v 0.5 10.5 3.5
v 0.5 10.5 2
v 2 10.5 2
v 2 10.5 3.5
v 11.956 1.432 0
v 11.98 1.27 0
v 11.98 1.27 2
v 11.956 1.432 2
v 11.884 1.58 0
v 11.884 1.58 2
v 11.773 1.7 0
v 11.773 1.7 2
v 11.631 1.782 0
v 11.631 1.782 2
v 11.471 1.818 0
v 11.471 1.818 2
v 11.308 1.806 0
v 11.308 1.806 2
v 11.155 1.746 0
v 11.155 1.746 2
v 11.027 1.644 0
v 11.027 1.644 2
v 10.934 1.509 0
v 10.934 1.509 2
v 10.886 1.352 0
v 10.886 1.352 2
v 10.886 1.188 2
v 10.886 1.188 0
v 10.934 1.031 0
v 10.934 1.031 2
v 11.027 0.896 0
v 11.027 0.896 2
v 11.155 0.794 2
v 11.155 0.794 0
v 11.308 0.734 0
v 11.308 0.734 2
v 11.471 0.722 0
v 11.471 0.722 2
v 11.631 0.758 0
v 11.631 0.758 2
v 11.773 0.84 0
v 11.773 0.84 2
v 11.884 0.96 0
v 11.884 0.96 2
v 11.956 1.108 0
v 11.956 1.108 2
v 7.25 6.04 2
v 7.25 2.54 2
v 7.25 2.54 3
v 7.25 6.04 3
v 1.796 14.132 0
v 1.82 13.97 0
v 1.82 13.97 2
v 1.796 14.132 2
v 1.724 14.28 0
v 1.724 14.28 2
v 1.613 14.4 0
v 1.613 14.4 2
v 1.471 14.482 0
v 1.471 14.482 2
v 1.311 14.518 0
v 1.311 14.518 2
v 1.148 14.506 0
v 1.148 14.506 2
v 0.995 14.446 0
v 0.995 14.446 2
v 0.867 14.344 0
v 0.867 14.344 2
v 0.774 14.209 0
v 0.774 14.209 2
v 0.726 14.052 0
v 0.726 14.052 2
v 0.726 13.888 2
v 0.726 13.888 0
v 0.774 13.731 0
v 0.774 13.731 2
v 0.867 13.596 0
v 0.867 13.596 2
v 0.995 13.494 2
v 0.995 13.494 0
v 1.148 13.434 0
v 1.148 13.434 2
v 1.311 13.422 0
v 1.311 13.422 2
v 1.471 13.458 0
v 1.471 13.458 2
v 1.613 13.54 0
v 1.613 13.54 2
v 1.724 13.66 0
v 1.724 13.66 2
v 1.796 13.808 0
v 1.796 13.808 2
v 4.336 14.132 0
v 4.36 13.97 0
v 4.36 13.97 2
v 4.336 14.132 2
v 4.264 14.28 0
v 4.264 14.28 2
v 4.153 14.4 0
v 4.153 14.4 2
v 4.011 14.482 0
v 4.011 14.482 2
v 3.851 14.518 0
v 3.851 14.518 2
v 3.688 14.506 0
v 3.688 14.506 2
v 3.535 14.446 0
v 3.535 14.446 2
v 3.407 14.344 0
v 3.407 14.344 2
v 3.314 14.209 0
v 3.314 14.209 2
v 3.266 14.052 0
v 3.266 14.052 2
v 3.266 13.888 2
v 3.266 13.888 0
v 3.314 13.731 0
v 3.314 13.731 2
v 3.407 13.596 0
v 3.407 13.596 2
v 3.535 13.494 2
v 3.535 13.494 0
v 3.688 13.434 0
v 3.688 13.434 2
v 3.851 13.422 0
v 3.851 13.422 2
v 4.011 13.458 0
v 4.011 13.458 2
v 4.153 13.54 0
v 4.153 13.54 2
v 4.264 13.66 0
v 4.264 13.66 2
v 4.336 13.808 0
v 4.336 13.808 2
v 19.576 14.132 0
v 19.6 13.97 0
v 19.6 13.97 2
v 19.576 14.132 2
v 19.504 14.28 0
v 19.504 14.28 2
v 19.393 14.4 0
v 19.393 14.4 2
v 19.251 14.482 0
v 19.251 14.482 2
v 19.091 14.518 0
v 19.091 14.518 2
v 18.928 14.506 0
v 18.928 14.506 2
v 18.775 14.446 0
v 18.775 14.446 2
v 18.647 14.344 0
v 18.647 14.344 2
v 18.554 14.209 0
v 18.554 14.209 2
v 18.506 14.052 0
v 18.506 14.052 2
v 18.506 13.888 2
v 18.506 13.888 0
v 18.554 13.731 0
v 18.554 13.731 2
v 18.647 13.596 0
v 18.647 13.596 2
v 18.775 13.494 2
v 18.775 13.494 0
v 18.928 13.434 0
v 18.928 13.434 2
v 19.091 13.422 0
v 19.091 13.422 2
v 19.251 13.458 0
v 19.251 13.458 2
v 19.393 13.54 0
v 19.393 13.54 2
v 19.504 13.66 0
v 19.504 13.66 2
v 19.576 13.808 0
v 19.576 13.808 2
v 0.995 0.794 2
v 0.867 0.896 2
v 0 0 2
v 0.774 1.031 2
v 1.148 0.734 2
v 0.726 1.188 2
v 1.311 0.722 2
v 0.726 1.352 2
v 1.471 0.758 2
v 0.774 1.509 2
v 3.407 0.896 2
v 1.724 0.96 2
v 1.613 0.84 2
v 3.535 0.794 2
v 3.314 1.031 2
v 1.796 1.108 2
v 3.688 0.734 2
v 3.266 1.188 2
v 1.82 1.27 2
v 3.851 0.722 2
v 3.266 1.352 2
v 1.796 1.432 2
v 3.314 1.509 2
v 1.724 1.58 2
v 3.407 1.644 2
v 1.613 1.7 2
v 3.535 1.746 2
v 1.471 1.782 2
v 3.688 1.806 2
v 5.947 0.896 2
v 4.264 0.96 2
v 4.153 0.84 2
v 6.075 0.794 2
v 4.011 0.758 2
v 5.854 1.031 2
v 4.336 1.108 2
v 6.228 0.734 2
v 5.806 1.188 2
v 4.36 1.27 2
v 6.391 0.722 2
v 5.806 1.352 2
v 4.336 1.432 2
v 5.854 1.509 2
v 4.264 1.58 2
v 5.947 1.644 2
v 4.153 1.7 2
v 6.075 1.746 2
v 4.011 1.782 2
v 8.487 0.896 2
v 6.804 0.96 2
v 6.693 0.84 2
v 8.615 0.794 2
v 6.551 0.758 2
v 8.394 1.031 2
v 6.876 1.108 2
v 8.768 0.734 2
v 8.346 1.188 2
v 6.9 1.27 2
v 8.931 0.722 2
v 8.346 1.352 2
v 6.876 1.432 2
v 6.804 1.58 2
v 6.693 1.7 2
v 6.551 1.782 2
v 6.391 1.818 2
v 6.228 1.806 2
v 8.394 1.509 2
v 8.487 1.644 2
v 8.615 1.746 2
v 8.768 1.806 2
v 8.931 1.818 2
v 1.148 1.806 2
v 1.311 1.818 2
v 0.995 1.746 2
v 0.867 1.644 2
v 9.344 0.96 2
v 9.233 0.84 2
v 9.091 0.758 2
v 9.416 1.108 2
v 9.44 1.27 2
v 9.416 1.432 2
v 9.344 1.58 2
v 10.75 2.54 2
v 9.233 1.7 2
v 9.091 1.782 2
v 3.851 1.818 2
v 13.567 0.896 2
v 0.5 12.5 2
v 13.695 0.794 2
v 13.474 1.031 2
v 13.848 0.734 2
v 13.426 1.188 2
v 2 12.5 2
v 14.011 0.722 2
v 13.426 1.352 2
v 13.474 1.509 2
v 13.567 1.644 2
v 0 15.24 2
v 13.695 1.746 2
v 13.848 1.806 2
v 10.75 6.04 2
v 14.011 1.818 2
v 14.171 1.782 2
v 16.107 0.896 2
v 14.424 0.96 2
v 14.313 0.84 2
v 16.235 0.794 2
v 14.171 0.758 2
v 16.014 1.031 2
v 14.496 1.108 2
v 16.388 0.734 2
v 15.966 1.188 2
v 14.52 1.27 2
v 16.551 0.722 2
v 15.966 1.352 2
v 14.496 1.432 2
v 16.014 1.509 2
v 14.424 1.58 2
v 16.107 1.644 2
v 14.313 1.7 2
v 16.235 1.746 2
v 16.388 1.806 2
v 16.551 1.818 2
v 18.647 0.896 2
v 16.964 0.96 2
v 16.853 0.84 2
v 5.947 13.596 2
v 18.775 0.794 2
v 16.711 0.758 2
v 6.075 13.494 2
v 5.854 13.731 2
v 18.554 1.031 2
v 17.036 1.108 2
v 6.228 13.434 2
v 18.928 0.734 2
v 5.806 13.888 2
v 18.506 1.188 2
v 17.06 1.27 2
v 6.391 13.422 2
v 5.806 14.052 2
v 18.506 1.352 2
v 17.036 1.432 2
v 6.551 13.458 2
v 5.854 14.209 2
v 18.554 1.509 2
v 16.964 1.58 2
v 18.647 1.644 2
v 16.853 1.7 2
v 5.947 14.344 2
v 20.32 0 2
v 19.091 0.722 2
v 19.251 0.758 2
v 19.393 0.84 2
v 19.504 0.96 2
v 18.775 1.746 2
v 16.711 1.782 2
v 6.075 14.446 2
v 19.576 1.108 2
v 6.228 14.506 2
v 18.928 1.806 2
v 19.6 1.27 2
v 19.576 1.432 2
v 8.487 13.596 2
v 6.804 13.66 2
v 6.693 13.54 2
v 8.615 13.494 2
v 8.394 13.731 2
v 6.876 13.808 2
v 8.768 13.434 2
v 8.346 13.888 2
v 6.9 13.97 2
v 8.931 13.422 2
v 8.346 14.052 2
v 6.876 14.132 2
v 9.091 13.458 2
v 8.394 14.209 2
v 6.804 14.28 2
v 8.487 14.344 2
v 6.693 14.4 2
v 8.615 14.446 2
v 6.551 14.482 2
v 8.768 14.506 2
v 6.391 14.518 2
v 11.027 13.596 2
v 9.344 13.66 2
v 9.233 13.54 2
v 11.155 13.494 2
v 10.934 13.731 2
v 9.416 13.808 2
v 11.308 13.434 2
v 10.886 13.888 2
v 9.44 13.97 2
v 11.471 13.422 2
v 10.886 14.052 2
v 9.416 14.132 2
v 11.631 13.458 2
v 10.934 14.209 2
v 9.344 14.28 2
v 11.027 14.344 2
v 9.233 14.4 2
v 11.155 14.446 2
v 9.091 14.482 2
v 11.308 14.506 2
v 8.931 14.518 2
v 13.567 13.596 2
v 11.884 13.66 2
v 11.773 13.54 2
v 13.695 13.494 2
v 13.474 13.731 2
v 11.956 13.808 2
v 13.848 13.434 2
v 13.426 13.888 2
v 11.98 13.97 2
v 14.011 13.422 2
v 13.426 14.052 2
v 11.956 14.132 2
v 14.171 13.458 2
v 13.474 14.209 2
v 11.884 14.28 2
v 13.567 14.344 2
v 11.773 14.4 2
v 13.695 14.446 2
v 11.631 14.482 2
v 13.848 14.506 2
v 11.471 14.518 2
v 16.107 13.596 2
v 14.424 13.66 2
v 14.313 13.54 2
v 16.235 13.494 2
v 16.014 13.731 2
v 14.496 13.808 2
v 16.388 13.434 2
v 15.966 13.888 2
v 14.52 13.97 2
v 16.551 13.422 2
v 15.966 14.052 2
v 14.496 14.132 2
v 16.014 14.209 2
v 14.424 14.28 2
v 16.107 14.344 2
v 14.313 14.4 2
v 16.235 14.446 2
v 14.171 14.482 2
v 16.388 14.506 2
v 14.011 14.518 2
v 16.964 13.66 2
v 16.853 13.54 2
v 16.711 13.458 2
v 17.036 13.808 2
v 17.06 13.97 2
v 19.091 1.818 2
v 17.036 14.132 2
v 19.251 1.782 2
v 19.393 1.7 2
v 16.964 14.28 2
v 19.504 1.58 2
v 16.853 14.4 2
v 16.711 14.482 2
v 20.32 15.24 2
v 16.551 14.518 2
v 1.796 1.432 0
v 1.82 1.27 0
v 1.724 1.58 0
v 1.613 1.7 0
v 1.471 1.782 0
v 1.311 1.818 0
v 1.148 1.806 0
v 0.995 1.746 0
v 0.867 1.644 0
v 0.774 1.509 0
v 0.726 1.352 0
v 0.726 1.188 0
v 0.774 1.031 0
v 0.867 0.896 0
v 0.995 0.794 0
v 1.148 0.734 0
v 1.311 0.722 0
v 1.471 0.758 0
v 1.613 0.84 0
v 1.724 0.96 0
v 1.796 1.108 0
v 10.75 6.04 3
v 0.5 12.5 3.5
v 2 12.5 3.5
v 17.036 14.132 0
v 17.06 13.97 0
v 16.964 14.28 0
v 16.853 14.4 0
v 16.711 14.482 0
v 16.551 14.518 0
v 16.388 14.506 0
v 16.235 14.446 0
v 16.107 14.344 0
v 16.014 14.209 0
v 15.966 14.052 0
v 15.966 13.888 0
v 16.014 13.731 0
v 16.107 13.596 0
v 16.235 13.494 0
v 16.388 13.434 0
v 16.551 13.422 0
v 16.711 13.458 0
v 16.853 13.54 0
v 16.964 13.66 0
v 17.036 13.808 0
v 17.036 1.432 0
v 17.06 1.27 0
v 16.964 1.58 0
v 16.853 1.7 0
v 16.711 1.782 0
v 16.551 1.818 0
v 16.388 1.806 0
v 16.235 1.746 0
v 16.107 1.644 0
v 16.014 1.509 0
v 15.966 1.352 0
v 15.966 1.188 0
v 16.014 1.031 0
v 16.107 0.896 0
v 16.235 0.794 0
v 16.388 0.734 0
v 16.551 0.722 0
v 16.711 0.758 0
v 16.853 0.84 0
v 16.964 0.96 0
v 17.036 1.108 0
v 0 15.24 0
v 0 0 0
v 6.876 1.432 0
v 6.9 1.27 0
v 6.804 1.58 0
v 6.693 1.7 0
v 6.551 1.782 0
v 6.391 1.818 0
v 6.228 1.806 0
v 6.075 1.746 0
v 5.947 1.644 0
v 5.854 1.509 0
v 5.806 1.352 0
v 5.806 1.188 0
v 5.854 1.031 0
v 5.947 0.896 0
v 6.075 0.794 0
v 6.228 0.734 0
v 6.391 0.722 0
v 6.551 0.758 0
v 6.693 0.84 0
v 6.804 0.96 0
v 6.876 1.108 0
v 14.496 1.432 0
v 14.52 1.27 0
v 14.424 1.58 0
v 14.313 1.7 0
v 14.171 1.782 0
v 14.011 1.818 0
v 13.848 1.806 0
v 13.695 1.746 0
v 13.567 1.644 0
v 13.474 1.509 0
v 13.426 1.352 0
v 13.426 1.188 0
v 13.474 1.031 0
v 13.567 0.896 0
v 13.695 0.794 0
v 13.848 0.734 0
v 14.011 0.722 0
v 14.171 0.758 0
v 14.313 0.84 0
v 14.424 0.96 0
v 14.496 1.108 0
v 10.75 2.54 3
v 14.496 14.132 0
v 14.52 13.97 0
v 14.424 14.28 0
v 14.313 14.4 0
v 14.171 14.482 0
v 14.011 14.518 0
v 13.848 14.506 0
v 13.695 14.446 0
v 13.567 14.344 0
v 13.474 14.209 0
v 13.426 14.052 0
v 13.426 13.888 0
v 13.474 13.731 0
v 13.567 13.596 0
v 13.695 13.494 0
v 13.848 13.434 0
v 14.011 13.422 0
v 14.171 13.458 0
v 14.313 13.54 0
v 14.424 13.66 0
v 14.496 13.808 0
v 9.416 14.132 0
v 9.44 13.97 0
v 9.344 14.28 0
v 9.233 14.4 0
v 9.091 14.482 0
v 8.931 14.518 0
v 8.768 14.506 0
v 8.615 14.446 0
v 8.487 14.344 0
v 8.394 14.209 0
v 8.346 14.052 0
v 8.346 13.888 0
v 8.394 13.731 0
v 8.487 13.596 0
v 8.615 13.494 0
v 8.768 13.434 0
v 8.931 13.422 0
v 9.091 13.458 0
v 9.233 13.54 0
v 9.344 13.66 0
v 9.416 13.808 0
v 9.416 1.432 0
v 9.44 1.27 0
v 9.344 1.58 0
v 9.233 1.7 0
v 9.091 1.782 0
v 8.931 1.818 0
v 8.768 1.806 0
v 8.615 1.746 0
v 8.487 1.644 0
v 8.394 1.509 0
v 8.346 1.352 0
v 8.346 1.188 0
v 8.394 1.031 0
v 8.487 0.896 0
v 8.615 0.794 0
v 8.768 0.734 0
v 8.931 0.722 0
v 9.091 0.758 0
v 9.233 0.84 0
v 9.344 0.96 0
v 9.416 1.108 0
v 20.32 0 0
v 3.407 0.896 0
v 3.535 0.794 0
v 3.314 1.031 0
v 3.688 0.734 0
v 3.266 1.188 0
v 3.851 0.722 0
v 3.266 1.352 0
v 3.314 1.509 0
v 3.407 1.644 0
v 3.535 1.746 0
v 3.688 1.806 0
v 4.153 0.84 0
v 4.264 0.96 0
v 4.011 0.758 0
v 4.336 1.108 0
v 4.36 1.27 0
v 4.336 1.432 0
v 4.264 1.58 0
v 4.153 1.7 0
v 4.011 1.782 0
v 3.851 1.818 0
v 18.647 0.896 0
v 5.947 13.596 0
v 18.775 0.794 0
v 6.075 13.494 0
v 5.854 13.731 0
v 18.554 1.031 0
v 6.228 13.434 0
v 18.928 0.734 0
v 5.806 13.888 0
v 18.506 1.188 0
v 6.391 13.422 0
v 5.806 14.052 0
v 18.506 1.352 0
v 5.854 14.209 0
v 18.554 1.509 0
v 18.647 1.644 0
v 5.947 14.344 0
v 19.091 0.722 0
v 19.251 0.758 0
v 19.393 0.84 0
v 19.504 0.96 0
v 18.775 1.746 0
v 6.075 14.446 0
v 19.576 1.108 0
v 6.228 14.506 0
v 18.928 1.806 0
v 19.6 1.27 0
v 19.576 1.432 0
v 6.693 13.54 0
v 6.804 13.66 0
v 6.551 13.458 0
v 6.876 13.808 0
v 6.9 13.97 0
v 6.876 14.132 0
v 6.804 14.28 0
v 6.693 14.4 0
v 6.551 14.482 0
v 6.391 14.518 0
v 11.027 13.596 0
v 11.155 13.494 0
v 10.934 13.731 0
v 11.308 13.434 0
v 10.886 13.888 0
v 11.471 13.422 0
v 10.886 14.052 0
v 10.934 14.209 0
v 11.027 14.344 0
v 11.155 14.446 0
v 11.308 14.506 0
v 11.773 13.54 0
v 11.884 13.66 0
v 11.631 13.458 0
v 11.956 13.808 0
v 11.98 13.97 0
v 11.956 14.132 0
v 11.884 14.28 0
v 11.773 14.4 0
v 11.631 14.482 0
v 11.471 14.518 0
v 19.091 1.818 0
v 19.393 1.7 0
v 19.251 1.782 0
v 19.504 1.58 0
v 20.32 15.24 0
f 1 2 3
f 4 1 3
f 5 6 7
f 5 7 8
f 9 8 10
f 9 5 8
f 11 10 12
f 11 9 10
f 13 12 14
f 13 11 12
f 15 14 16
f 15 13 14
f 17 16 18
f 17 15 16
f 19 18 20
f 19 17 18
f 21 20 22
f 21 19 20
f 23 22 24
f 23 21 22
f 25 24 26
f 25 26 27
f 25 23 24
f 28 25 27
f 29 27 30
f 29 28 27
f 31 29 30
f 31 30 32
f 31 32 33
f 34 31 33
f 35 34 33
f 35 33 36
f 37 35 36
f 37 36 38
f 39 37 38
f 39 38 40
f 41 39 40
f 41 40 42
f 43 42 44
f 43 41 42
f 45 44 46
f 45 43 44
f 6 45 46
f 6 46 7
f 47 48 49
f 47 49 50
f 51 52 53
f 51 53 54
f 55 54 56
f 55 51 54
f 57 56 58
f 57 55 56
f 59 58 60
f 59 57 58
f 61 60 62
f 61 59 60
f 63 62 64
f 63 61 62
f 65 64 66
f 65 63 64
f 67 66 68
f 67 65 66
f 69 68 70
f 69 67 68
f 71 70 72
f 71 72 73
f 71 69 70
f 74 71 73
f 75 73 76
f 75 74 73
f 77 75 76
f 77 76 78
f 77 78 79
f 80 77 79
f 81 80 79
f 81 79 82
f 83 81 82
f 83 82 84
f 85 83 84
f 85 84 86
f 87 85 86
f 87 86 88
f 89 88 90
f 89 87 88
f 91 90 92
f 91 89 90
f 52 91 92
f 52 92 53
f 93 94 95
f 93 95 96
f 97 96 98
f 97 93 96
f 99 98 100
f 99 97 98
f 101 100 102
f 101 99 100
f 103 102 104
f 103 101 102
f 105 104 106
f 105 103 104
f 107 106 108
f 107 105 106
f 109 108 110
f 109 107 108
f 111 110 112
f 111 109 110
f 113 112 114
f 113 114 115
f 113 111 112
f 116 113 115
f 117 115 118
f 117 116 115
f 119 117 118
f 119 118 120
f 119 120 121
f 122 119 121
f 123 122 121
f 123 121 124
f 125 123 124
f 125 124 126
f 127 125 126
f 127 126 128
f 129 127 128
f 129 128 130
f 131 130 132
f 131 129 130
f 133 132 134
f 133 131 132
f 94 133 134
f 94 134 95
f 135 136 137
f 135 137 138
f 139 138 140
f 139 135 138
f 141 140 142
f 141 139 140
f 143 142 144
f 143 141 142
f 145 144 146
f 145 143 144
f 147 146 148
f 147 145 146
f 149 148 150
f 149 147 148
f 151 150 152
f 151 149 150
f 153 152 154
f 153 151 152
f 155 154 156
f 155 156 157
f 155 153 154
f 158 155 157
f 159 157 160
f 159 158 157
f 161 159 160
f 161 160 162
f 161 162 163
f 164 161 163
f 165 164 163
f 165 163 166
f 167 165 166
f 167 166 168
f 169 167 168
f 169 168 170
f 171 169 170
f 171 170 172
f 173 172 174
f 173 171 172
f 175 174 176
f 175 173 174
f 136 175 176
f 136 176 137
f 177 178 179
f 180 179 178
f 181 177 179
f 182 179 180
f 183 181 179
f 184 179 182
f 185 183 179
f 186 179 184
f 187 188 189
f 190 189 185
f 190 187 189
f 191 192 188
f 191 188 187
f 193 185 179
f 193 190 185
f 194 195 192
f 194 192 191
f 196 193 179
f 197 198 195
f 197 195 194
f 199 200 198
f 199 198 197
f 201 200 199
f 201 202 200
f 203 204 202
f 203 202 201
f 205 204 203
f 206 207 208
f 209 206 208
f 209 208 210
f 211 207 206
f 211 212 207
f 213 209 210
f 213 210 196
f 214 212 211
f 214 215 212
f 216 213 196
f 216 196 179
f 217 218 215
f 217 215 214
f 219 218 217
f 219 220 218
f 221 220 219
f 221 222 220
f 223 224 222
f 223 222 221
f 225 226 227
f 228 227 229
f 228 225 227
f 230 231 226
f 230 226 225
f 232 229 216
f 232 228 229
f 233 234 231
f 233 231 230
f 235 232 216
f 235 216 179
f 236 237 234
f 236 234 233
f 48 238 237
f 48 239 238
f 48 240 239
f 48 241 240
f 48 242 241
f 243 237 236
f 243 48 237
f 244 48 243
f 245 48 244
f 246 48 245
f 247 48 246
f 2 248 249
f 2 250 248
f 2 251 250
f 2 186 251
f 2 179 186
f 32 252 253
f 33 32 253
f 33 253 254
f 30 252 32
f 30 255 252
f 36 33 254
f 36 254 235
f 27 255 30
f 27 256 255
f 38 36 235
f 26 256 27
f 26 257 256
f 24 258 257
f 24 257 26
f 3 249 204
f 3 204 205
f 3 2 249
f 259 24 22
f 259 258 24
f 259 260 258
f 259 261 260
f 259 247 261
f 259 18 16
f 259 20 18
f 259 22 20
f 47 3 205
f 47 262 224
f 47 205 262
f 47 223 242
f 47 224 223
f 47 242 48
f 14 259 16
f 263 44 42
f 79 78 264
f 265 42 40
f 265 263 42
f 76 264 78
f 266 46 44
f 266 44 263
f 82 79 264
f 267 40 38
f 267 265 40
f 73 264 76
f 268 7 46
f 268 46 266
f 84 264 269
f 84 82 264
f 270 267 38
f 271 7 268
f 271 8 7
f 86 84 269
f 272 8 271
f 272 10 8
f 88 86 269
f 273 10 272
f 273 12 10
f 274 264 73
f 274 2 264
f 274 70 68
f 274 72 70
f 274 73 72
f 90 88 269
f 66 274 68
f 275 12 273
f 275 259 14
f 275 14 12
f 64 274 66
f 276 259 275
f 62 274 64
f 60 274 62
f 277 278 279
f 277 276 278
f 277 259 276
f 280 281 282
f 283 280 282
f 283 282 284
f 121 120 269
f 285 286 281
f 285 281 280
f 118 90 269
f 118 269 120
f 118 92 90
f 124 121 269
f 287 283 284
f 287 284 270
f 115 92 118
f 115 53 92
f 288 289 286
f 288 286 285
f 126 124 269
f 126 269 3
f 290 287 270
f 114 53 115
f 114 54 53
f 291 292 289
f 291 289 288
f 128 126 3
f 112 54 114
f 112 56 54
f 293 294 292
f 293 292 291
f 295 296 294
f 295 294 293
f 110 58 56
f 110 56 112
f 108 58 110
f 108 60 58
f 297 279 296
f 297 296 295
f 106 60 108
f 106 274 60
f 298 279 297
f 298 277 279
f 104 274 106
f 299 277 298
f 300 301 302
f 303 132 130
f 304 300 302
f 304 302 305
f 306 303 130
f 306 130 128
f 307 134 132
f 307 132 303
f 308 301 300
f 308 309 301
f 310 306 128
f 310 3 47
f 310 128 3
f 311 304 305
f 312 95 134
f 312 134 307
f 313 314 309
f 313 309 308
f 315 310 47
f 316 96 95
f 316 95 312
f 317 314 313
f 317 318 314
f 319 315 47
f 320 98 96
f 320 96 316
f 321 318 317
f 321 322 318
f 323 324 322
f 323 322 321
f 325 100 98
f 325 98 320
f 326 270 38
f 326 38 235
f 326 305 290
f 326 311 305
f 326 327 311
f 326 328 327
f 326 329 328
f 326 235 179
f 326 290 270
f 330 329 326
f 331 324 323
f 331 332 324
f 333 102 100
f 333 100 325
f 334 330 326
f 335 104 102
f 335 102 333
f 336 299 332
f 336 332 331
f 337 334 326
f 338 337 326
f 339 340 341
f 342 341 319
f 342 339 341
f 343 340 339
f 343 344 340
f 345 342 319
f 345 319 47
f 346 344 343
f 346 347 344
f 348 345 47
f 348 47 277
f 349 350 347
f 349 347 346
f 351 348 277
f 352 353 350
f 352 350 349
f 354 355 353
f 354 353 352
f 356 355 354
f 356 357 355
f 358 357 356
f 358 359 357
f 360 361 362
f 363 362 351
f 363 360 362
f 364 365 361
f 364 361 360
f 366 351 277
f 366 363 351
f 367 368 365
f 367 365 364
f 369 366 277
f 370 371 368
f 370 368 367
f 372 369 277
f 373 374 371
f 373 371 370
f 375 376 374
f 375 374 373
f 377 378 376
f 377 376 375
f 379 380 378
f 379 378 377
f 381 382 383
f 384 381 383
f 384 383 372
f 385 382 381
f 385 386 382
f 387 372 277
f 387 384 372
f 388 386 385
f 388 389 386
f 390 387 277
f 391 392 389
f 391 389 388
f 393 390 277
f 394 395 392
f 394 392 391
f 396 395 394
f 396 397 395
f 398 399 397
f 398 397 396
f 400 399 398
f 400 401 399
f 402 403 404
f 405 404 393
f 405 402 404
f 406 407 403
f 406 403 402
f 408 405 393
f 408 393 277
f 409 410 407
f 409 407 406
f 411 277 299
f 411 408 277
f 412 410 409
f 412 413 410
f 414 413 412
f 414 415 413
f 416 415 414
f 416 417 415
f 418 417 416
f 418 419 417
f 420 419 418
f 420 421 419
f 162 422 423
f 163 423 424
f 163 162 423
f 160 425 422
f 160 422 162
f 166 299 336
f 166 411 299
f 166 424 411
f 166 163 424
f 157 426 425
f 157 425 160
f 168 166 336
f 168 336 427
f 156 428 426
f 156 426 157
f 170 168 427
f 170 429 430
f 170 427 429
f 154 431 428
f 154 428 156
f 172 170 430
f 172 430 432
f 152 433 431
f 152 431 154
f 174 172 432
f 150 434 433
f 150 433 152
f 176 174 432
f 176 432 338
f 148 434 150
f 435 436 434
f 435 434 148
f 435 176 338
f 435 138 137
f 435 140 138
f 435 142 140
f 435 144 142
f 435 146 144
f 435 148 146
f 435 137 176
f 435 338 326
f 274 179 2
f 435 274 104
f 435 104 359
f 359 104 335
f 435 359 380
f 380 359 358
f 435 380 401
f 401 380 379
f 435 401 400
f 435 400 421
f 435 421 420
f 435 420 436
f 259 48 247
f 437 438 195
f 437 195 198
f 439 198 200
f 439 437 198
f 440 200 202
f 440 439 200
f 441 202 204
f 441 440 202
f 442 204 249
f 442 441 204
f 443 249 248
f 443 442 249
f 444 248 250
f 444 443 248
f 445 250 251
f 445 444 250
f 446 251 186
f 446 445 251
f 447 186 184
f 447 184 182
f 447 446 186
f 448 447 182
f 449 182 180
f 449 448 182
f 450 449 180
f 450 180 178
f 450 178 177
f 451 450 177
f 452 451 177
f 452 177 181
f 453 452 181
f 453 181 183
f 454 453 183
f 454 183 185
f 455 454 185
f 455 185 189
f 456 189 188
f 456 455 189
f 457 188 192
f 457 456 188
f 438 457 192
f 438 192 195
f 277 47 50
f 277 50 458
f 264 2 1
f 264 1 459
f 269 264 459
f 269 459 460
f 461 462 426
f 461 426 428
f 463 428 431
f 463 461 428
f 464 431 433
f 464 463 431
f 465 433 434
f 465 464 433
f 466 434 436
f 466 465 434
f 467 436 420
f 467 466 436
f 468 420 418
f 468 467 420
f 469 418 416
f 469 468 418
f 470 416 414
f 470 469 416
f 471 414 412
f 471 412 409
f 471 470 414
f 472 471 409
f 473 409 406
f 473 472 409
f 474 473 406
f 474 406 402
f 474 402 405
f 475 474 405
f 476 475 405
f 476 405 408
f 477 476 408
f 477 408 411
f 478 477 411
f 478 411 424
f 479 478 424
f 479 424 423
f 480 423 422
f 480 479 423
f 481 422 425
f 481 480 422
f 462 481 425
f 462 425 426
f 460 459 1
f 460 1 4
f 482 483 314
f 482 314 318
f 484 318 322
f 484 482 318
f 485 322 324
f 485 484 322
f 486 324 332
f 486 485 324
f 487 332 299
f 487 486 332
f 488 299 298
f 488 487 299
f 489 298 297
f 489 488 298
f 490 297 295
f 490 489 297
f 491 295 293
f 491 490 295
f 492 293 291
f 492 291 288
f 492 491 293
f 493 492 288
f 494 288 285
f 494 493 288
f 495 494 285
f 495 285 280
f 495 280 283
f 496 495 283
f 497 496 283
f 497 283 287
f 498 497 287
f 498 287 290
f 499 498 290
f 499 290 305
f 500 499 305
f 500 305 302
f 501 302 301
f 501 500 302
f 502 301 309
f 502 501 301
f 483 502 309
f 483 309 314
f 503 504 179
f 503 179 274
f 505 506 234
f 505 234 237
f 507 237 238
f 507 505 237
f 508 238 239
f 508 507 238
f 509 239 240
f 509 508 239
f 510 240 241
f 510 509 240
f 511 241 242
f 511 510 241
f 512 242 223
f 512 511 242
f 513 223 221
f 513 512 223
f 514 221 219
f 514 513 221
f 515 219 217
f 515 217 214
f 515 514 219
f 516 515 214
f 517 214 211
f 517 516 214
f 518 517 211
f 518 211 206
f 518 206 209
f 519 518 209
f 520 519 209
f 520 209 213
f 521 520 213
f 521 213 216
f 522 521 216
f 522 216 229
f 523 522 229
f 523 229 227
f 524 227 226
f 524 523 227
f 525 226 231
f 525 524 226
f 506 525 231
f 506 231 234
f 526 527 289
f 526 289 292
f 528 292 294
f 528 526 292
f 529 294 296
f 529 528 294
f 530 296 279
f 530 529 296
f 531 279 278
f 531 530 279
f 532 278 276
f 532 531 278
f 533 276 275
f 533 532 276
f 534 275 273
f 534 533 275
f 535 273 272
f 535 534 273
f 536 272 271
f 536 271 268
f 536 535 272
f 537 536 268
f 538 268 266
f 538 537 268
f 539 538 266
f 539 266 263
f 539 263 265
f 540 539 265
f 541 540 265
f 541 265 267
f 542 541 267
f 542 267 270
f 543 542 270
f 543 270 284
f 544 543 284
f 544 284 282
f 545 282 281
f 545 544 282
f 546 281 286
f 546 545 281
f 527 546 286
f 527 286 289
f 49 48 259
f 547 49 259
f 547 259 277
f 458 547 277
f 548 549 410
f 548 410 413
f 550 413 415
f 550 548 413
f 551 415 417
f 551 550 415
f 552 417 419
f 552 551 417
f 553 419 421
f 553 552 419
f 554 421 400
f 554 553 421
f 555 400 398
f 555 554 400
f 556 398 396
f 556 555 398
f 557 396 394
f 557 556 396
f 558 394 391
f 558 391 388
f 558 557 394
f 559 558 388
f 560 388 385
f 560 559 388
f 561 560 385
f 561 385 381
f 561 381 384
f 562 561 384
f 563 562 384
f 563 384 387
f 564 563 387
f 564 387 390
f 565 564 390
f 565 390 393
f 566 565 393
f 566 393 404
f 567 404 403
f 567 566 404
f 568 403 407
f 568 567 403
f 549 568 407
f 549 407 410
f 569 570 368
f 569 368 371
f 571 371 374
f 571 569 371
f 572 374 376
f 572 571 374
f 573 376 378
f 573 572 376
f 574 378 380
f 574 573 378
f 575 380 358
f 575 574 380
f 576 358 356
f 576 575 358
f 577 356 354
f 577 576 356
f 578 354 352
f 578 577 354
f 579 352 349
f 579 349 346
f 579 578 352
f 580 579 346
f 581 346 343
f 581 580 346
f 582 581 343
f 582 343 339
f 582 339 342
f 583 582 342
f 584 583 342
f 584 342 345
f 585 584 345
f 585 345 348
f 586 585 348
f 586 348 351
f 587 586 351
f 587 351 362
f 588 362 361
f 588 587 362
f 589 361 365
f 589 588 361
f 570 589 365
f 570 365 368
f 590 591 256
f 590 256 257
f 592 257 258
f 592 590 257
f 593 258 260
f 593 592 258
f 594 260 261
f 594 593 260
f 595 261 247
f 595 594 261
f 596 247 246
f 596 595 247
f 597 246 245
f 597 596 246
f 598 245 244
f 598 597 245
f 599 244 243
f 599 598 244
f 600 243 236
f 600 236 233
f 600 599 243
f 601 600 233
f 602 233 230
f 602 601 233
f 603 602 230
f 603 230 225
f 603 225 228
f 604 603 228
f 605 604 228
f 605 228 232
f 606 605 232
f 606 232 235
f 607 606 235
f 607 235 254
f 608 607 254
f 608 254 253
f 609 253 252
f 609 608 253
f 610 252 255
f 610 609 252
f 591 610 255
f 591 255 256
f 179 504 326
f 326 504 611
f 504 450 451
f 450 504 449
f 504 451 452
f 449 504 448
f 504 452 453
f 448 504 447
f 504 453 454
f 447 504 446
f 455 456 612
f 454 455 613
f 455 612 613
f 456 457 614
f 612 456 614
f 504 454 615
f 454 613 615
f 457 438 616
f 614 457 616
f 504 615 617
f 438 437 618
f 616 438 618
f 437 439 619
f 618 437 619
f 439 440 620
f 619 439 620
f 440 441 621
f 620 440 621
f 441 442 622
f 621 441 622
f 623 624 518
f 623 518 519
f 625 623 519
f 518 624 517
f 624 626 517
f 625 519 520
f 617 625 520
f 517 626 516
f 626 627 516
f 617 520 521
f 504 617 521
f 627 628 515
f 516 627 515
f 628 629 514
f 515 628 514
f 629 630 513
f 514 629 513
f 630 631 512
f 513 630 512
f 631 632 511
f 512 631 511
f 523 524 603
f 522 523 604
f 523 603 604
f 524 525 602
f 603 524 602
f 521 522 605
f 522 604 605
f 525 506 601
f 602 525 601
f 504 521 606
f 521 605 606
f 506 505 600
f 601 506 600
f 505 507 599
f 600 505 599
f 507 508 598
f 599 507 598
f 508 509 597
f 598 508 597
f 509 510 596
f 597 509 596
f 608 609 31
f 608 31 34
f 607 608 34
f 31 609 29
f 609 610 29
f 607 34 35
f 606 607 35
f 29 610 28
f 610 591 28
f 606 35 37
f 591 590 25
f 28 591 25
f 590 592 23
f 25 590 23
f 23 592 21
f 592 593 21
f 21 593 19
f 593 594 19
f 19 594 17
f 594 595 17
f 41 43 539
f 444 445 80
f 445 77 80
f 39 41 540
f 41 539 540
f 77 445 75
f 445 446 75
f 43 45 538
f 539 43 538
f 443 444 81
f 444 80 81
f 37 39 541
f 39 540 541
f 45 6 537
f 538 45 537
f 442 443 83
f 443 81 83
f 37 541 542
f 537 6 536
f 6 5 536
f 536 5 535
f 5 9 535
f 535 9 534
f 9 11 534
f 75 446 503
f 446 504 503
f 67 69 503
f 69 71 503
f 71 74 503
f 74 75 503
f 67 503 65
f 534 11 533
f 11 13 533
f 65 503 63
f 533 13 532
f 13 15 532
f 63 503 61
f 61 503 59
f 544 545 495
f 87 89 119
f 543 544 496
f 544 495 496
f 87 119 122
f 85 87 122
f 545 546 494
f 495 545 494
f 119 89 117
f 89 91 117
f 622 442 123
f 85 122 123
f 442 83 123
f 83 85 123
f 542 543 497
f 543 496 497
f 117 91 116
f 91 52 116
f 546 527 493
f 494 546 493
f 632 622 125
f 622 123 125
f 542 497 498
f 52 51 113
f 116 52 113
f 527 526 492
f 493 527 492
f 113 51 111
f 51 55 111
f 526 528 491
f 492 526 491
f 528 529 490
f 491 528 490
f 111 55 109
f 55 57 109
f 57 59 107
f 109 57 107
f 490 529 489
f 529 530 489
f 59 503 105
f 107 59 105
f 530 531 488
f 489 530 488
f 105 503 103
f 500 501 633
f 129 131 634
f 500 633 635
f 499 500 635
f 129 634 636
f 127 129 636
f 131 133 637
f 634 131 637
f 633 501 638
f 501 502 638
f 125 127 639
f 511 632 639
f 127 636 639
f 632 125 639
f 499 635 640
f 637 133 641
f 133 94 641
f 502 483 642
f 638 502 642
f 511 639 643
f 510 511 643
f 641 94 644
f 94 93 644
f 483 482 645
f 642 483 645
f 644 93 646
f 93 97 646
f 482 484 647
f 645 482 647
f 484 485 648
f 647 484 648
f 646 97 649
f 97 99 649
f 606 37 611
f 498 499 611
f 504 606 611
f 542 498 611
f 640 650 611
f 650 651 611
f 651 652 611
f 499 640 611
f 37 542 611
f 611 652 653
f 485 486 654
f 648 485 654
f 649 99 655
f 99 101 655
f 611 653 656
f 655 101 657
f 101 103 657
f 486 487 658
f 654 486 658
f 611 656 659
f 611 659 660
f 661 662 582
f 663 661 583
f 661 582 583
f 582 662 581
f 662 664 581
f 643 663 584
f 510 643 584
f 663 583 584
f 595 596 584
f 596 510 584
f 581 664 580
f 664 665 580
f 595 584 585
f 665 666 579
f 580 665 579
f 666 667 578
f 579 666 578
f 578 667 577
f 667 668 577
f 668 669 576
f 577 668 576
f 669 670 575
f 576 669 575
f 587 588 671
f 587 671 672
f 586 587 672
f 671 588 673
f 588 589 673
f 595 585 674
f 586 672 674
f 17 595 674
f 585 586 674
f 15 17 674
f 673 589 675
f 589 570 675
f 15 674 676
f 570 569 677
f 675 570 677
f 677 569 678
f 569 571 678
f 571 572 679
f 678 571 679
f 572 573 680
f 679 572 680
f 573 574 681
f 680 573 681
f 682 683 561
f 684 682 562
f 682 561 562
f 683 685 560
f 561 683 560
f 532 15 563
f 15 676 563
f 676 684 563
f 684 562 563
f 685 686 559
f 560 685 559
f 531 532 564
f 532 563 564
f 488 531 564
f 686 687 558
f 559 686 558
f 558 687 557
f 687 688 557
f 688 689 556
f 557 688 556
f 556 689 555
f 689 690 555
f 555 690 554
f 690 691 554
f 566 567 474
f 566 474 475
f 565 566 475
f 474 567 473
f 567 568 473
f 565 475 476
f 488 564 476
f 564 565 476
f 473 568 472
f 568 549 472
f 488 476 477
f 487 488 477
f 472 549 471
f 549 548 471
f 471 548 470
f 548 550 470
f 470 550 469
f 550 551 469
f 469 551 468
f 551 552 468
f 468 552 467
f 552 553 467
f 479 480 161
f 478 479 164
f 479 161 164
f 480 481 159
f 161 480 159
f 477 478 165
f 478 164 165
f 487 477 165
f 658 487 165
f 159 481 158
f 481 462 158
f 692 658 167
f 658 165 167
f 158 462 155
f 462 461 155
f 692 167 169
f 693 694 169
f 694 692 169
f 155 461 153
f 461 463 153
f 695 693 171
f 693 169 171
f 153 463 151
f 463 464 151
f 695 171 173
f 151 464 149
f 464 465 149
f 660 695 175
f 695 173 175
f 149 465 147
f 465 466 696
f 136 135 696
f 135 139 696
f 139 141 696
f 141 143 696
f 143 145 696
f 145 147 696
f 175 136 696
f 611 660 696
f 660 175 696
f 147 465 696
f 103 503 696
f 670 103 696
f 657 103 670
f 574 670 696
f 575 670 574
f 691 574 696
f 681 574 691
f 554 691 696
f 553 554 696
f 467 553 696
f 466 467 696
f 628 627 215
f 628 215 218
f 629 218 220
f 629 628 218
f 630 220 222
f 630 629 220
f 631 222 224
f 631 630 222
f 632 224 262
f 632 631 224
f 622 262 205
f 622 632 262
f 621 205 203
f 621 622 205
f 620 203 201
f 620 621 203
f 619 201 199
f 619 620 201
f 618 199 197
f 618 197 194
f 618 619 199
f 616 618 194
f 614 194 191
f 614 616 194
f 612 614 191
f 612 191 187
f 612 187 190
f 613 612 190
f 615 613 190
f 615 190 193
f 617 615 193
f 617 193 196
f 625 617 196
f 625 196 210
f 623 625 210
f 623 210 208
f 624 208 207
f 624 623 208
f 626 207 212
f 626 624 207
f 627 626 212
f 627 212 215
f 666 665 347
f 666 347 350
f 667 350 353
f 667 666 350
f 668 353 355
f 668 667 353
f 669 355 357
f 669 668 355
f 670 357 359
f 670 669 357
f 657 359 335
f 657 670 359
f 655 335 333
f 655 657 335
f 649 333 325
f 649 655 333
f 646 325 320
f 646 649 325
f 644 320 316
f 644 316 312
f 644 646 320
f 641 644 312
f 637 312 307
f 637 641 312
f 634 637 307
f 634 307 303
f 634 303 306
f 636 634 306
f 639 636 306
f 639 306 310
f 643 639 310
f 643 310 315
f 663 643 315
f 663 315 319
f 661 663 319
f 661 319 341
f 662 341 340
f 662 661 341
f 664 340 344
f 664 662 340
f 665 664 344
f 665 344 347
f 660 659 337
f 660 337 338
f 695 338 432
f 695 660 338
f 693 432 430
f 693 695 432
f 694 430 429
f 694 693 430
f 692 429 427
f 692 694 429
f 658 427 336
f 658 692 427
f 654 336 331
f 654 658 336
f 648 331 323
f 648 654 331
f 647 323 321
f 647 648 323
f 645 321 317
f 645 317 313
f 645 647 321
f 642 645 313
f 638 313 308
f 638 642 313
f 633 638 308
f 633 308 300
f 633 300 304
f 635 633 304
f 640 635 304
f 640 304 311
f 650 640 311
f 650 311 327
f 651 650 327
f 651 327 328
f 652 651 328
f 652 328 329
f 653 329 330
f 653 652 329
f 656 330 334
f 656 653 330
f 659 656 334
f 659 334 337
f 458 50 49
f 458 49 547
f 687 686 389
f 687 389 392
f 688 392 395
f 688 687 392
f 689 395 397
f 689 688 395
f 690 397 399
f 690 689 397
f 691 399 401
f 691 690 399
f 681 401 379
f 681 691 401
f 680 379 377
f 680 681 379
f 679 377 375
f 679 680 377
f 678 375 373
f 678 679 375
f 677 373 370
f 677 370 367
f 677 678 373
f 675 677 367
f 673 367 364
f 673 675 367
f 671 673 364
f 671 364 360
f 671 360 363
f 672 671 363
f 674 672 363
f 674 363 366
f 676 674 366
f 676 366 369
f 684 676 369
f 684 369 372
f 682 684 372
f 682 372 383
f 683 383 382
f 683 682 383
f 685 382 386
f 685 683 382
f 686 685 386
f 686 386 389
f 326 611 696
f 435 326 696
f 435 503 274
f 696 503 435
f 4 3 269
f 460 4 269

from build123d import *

# Parameters (mm, degrees)
F0_W     = 20.32
F0_H     = 15.24
F0_R     = 0.55
F1_DEPTH = 2
F3_W     = 1.5
F3_H     = 2
F4_DEPTH = 1.5
F3_W_2   = 3.5
F3_H_2   = 3.5
F5_DEPTH = 1


with BuildPart() as f1:
    # F0 (on Top) → F1 (new body)
    with BuildSketch(Plane.XY):
        with Locations((10.16, 7.62)):
            Rectangle(F0_W, F0_H)
        with Locations((1.27, 1.27)):
            Circle(F0_R, mode=Mode.SUBTRACT)
        with Locations((3.81, 1.27)):
            Circle(F0_R, mode=Mode.SUBTRACT)
        with Locations((6.35, 1.27)):
            Circle(F0_R, mode=Mode.SUBTRACT)
        with Locations((8.89, 1.27)):
            Circle(F0_R, mode=Mode.SUBTRACT)
        with Locations((11.43, 1.27)):
            Circle(F0_R, mode=Mode.SUBTRACT)
        with Locations((13.97, 1.27)):
            Circle(F0_R, mode=Mode.SUBTRACT)
        with Locations((16.51, 1.27)):
            Circle(F0_R, mode=Mode.SUBTRACT)
        with Locations((19.05, 1.27)):
            Circle(F0_R, mode=Mode.SUBTRACT)
        with Locations((1.27, 13.97)):
            Circle(F0_R, mode=Mode.SUBTRACT)
        with Locations((3.81, 13.97)):
            Circle(F0_R, mode=Mode.SUBTRACT)
        with Locations((6.35, 13.97)):
            Circle(F0_R, mode=Mode.SUBTRACT)
        with Locations((8.89, 13.97)):
            Circle(F0_R, mode=Mode.SUBTRACT)
        with Locations((11.43, 13.97)):
            Circle(F0_R, mode=Mode.SUBTRACT)
        with Locations((13.97, 13.97)):
            Circle(F0_R, mode=Mode.SUBTRACT)
        with Locations((16.51, 13.97)):
            Circle(F0_R, mode=Mode.SUBTRACT)
        with Locations((19.05, 13.97)):
            Circle(F0_R, mode=Mode.SUBTRACT)
    extrude(amount=F1_DEPTH)

    # F3 (on offset) → F4 (join)
    with BuildSketch(Plane.XY.offset(2)):
        with Locations((1.25, 11.5)):
            Rectangle(F3_W, F3_H)
    extrude(amount=F4_DEPTH)

    # F3 (on offset) → F5 (join)
    with BuildSketch(Plane.XY.offset(2)):
        with Locations((9, 4.29)):
            Rectangle(F3_W_2, F3_H_2)
    extrude(amount=F5_DEPTH)


solid = f1.part
